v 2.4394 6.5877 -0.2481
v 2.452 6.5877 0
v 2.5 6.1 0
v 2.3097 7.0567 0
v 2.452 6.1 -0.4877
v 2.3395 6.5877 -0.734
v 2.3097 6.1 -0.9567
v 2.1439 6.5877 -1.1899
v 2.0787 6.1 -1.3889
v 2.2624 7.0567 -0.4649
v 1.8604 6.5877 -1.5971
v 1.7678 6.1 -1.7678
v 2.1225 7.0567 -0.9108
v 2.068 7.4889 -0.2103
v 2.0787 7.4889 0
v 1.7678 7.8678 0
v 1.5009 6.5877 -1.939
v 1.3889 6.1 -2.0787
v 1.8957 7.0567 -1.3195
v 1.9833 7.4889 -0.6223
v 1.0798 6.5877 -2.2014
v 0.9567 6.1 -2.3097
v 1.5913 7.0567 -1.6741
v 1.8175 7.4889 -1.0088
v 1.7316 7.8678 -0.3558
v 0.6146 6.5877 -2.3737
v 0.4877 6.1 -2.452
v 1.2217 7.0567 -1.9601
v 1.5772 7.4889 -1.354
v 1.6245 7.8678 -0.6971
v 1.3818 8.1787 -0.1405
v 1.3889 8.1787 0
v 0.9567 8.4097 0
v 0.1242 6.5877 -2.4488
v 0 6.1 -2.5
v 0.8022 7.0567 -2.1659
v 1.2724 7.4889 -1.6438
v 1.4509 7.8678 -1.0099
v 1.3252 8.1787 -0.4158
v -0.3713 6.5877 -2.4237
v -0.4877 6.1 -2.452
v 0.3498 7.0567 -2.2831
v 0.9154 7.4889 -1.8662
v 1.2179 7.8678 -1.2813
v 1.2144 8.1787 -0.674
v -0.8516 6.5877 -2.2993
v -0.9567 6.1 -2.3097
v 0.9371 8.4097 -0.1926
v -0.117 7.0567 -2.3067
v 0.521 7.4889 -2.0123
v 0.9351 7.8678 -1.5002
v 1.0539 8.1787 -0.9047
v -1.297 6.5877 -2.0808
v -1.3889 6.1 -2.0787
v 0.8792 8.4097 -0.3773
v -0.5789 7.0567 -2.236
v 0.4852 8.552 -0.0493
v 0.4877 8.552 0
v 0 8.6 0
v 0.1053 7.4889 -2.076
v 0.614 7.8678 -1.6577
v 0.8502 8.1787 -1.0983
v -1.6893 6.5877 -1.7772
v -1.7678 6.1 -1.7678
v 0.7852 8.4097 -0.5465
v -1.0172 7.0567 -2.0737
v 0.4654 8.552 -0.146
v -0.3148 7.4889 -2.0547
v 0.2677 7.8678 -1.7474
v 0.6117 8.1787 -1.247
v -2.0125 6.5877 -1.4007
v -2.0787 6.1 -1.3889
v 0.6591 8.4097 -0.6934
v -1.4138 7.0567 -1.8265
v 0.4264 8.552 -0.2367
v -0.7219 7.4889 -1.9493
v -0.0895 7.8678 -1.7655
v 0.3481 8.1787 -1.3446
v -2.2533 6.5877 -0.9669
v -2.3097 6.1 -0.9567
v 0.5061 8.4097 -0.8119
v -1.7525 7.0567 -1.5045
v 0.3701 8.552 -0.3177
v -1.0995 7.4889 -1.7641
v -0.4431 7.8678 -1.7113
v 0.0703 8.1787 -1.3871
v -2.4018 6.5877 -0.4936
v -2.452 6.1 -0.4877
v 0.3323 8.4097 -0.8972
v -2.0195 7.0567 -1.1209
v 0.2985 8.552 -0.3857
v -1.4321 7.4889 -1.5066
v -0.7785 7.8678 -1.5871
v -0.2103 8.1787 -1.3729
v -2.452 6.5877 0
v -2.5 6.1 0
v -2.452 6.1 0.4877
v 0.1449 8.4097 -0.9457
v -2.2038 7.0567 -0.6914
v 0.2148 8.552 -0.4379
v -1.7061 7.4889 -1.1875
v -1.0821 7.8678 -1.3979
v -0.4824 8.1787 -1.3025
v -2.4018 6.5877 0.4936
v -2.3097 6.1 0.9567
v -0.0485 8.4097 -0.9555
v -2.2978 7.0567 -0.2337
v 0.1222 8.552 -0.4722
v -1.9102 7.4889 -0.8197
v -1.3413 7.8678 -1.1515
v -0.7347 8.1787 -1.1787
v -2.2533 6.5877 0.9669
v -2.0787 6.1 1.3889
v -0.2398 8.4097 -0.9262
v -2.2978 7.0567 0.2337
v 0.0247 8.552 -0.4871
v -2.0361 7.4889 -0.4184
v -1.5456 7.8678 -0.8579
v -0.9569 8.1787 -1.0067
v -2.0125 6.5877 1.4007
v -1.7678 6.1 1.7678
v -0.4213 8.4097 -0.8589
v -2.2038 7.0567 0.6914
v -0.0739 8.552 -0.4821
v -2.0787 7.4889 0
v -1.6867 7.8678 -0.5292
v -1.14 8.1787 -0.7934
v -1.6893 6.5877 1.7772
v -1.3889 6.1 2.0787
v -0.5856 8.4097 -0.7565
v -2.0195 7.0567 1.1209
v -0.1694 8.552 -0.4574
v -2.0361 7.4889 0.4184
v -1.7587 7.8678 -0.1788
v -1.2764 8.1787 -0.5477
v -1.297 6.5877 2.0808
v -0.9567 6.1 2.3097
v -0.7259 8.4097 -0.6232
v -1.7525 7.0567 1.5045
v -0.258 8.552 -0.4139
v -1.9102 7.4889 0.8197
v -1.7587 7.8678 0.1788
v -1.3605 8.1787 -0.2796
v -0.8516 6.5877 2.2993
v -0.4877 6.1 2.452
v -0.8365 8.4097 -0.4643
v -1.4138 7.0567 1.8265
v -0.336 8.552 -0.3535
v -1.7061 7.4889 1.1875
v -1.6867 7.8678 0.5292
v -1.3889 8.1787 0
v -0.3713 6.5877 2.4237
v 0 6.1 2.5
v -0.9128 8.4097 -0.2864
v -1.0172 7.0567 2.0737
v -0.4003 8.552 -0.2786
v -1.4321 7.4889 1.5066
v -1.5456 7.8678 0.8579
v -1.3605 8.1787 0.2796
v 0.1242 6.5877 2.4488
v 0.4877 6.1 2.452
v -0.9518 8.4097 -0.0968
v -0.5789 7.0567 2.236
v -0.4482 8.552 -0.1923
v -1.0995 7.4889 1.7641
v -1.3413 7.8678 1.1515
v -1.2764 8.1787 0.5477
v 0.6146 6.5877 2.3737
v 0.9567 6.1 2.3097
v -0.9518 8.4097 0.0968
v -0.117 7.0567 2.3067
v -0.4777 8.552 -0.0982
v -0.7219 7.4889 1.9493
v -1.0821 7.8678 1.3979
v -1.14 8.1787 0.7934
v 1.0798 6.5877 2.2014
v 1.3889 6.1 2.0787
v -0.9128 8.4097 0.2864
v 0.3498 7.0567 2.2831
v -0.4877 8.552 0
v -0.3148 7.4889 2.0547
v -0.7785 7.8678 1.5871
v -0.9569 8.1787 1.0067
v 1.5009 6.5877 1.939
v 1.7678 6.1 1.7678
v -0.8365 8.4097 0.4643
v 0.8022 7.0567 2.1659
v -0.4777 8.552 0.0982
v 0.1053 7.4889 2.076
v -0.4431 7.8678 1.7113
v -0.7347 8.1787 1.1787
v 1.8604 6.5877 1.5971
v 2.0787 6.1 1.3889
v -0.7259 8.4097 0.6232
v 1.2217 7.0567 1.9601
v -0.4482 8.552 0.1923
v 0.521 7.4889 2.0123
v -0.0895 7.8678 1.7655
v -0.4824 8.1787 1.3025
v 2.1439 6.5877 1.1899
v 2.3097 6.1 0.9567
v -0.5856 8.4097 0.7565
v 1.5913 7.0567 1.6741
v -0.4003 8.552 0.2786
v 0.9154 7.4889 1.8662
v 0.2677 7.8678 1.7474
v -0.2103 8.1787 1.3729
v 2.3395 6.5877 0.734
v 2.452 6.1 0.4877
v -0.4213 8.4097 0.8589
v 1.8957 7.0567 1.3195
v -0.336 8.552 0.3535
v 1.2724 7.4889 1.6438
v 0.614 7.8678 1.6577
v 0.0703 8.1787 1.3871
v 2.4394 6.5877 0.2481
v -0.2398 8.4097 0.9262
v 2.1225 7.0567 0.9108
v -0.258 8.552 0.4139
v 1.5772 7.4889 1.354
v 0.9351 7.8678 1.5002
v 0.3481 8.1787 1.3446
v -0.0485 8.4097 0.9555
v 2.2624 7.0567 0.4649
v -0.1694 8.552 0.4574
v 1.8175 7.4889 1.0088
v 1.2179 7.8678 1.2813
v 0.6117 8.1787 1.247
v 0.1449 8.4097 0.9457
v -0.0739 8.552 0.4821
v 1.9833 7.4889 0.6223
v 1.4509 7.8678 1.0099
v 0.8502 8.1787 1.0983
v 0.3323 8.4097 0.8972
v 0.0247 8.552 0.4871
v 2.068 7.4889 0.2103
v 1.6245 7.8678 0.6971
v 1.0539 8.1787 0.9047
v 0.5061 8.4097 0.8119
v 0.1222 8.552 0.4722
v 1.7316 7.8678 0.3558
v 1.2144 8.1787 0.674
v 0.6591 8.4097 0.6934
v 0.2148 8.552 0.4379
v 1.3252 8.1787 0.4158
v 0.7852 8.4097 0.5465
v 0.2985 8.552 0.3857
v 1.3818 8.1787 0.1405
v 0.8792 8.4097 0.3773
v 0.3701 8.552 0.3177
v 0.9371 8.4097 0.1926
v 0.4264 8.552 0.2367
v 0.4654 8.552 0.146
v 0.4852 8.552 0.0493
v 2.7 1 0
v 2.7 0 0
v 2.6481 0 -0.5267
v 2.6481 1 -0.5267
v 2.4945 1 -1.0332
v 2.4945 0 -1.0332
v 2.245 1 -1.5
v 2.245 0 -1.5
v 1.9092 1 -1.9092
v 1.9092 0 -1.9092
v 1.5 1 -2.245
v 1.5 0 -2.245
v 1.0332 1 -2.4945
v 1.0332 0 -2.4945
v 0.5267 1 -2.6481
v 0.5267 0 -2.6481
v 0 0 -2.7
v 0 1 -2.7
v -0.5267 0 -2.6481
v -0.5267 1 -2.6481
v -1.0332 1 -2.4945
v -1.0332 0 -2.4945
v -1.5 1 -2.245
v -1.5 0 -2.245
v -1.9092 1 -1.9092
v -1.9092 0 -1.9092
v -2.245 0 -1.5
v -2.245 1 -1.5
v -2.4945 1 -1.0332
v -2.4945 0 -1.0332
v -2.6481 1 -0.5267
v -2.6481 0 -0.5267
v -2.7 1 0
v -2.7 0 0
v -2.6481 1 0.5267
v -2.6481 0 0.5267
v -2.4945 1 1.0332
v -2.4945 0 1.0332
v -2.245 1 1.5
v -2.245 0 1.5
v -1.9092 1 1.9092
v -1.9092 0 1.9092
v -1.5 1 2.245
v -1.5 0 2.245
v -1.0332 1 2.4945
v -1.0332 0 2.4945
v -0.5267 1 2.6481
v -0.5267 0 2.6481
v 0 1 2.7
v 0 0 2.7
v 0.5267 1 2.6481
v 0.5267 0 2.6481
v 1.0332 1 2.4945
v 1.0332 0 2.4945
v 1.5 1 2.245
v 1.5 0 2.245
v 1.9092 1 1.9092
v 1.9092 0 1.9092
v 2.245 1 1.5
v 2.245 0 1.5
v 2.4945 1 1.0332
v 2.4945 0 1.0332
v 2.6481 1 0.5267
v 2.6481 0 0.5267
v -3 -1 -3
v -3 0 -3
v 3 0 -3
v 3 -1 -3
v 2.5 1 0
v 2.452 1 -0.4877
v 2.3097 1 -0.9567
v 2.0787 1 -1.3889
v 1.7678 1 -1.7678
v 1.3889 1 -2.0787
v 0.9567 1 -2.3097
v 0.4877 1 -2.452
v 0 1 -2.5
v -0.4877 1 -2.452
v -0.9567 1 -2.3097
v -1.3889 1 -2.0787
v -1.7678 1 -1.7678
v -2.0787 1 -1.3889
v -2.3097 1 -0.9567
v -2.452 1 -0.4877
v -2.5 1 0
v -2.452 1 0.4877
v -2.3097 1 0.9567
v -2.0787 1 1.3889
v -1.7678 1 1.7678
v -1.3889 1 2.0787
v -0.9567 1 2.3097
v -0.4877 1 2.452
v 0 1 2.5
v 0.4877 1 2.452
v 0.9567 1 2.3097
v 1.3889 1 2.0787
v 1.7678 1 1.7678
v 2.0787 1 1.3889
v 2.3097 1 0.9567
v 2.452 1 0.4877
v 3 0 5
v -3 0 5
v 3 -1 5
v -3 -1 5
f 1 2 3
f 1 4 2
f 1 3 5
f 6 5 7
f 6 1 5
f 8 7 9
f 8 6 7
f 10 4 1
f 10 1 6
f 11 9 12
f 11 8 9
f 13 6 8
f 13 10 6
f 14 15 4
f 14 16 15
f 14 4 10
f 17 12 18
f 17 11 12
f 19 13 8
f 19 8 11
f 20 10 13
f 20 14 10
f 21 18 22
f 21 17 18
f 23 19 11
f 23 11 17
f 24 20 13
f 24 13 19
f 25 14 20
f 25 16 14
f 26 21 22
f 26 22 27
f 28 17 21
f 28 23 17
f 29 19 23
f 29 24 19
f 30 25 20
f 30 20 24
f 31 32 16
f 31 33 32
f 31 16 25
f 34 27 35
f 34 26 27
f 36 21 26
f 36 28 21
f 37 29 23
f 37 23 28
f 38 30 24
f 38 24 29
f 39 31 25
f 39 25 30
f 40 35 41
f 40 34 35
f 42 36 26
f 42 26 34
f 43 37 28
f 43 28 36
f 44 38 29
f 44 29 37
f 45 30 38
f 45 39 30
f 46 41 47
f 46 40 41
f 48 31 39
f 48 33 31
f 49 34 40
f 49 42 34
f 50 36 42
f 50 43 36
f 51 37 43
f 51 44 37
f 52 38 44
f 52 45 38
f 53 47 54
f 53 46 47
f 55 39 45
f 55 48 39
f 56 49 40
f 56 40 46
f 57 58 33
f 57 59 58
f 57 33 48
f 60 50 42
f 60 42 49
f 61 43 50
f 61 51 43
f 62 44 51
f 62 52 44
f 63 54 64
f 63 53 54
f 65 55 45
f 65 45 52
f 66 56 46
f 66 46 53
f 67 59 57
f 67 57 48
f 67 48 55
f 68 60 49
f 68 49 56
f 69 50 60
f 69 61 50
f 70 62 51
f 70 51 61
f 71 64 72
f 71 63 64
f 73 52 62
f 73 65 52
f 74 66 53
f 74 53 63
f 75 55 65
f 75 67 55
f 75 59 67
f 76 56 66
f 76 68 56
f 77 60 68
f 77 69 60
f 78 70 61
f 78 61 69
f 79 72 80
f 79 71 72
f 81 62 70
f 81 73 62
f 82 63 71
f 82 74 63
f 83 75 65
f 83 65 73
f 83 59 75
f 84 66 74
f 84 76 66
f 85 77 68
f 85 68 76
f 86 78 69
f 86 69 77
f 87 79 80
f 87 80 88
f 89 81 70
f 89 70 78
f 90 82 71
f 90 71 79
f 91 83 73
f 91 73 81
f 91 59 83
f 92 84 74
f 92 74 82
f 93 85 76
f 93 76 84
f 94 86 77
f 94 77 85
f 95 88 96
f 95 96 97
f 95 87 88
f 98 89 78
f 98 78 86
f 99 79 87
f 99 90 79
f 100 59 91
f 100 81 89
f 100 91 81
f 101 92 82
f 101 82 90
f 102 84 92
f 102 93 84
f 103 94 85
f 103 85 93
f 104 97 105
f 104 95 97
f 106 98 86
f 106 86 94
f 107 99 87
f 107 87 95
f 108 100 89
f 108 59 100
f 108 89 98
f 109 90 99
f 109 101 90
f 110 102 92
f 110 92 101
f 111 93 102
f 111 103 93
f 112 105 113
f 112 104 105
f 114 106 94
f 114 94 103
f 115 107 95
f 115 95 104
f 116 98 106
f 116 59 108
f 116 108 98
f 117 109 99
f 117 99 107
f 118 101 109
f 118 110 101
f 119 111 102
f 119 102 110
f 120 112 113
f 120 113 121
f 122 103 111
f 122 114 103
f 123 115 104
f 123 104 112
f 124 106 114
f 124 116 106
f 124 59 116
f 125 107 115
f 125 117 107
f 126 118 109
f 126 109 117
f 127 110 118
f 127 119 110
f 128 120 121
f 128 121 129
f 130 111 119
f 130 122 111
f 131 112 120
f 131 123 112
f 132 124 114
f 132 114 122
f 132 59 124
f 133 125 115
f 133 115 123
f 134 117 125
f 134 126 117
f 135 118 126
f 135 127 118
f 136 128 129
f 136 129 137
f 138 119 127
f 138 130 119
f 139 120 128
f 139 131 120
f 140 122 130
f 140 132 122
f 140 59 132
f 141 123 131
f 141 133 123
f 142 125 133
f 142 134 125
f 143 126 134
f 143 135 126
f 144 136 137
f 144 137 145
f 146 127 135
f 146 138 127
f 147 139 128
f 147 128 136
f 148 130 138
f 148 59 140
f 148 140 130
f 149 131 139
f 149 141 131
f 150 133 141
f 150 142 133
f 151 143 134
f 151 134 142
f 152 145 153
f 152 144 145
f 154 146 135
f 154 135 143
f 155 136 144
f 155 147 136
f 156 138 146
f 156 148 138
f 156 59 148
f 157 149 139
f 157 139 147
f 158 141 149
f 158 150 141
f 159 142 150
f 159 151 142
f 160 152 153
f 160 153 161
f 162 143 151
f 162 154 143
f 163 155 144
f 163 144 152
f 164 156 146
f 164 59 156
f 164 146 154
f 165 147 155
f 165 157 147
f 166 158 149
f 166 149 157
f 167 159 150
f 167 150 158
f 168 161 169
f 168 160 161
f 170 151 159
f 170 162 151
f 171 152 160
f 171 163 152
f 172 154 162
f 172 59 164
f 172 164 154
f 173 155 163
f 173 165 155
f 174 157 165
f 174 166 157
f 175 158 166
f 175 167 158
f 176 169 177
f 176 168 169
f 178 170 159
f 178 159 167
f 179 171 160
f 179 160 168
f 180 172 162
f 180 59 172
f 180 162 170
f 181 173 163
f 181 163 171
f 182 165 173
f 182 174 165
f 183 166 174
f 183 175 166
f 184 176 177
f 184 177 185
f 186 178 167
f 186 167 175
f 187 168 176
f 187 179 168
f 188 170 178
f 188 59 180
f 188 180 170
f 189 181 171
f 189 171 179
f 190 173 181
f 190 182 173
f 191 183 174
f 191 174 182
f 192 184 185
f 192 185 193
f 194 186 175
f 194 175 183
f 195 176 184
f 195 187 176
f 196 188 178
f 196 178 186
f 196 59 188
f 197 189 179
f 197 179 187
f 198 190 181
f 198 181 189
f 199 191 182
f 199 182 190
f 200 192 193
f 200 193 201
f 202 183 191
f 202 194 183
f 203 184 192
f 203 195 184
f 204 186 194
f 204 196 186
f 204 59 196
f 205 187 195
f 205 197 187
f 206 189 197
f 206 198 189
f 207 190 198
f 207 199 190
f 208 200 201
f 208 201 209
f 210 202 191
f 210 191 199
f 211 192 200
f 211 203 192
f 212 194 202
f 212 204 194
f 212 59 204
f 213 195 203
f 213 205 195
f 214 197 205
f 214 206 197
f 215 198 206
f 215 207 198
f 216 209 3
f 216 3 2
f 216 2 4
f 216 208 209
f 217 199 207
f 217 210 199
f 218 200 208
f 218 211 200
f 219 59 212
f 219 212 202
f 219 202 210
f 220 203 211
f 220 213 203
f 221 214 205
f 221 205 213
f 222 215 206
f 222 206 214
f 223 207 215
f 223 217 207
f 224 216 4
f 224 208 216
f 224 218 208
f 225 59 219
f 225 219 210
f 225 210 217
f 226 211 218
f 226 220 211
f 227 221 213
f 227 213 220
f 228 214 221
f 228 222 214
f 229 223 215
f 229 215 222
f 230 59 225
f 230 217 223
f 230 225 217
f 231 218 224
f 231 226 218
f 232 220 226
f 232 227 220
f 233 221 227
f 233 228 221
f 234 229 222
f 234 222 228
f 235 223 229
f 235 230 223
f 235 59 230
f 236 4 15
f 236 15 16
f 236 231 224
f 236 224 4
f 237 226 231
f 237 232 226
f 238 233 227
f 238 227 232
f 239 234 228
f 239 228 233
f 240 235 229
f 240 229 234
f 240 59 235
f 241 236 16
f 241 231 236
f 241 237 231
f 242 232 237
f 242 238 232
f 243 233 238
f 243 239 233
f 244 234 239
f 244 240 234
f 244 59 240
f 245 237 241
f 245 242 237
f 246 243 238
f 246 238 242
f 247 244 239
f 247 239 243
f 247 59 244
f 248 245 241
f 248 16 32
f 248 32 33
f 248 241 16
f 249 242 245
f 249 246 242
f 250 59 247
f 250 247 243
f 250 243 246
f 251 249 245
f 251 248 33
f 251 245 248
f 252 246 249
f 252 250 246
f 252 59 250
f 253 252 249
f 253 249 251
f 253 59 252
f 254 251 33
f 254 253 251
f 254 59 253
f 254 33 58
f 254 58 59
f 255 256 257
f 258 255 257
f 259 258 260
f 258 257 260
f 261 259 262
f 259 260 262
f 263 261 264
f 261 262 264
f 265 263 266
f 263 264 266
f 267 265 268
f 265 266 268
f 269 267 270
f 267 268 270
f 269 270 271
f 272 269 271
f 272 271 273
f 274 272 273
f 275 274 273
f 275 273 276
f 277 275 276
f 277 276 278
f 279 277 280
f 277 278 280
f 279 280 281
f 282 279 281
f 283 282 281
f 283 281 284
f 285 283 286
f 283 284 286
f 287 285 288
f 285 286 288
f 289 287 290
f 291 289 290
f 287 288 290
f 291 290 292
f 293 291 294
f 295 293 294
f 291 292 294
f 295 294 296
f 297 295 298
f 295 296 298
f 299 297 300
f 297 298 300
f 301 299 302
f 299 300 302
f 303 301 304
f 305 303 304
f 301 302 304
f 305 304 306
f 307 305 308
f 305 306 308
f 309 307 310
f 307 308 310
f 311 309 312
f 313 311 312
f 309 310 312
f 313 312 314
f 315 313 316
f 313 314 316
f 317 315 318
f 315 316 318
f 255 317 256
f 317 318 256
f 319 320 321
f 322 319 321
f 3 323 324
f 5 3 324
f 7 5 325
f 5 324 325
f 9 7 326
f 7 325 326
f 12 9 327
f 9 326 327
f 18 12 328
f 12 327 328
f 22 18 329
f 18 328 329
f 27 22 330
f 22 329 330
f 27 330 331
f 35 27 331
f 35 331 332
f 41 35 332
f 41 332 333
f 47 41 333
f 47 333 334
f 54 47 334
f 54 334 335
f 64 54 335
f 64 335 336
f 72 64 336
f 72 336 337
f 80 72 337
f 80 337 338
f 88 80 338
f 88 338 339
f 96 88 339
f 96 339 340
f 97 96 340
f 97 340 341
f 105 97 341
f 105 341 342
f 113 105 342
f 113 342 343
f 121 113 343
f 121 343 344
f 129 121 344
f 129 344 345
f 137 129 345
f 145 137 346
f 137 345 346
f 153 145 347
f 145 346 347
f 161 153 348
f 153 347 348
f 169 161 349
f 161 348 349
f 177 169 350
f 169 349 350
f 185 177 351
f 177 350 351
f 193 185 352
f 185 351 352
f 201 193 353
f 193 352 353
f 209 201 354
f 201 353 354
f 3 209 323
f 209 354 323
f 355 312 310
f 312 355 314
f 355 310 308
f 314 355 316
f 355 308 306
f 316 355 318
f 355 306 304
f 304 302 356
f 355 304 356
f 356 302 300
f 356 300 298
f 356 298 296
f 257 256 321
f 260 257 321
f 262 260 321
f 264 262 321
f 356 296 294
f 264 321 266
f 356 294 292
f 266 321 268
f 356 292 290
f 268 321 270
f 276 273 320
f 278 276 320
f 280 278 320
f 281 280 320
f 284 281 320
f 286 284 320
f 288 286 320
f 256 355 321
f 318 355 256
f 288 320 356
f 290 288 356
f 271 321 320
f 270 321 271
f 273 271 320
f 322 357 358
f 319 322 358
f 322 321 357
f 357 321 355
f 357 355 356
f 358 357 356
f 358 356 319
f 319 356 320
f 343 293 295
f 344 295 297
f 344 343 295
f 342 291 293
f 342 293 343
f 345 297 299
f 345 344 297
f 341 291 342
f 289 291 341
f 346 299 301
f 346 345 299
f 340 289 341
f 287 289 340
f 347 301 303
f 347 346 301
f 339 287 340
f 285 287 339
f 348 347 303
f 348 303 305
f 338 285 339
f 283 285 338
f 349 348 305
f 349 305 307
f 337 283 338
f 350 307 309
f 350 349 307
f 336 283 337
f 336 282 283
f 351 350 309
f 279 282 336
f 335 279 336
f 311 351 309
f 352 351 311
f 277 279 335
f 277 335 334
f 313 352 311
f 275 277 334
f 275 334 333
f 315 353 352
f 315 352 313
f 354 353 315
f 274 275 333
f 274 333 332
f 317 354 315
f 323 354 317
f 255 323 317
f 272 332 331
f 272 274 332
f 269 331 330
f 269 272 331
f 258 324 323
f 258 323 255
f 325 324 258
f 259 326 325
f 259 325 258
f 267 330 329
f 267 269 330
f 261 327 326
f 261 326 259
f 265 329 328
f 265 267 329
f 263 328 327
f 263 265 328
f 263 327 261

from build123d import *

# Parameters (mm, degrees)
SKETCH1_R           = 2.5
BOSS_EXTRUDE1_DEPTH = 8.6
FILLET1_R           = 2.5
BOSS_EXTRUDE2_DEPTH = 1
SKETCH3_R           = 2.7
BOSS_EXTRUDE3_DEPTH = 1


with BuildPart() as part:
    # Sketch1 → Boss-Extrude1 (new body)
    with BuildSketch(Plane(origin=(0, 0, 0), x_dir=(1, 0, 0), z_dir=(0, 1, 0))):
        Circle(SKETCH1_R)
    extrude(amount=BOSS_EXTRUDE1_DEPTH)

    # Fillet1
    fillet1_edges = [part.edges().sort_by_distance(p)[0] for p in [
        (-2.5, 8.6, 0),
    ]]
    fillet(fillet1_edges, radius=FILLET1_R)

    # Sketch2 → Boss-Extrude2 (add)
    with BuildSketch(Plane(origin=(0, 0, 0), x_dir=(-1, 0, 0), z_dir=(0, -1, 0))):
        Polygon((0, 3), (-3, 3), (-3, -5), (0, -5), (3, -5), (3, 3), align=None)
    extrude(amount=BOSS_EXTRUDE2_DEPTH)

    # Sketch3 → Boss-Extrude3 (add)
    with BuildSketch(Plane(origin=(0, 0, 0), x_dir=(1, 0, 0), z_dir=(0, 1, 0))):
        Circle(SKETCH3_R)
    extrude(amount=BOSS_EXTRUDE3_DEPTH)


solid = part.part
